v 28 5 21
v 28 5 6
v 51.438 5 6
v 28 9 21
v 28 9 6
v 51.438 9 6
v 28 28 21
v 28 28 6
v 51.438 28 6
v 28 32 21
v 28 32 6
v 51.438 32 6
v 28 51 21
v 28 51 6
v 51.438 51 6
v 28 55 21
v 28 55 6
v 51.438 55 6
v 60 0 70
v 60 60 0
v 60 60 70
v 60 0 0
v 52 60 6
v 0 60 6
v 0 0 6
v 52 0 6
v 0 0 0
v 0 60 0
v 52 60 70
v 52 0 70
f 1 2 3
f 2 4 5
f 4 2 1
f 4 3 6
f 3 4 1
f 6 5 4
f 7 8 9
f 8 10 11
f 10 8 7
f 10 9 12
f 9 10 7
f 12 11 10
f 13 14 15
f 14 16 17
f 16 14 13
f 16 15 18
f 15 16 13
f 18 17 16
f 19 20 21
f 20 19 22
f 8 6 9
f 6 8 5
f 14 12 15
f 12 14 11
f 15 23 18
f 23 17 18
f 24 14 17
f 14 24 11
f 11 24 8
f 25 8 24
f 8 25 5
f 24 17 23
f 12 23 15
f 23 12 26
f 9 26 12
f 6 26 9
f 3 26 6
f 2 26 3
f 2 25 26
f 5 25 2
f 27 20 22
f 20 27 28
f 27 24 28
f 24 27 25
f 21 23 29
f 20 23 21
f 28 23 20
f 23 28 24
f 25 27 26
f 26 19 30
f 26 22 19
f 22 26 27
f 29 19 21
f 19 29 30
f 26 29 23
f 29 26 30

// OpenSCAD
$fn = 32;

// ----------------------------------------------------------------------
// Rib bracket: 3-gusset L bracket
// ----------------------------------------------------------------------

// --- parameters (mm) ---
base_l = 60;              // foot length, X
base_w = 60;              // foot width, Y
base_t = 6;               // foot thickness
plate_t = 8;              // upright plate thickness
plate_h = 70;             // overall height
gus_l = 24;               // gusset leg along the foot
gus_h = 16;               // gusset height
gus_t = 4;                // gusset thickness
gus_edge = 5;             // gusset margin from the foot edge
n_gus = 3;                // gusset count

gus_pitch = (base_w - 2 * gus_edge - gus_t) / (n_gus - 1);  // gusset pitch

union() {
  cube([base_l, base_w, base_t]);
  translate([base_l - plate_t, 0, base_t - 1])
    cube([plate_t, base_w, plate_h - base_t + 1]);
  for (i = [0 : n_gus - 1])
    translate([base_l - plate_t - gus_l, gus_edge + i * gus_pitch, base_t - 1])
      rotate([-90, 0, 0])
        linear_extrude(height = gus_t)
          polygon(points = [[0, 0], [gus_l + 1, 0], [0, -gus_h]]);
}
